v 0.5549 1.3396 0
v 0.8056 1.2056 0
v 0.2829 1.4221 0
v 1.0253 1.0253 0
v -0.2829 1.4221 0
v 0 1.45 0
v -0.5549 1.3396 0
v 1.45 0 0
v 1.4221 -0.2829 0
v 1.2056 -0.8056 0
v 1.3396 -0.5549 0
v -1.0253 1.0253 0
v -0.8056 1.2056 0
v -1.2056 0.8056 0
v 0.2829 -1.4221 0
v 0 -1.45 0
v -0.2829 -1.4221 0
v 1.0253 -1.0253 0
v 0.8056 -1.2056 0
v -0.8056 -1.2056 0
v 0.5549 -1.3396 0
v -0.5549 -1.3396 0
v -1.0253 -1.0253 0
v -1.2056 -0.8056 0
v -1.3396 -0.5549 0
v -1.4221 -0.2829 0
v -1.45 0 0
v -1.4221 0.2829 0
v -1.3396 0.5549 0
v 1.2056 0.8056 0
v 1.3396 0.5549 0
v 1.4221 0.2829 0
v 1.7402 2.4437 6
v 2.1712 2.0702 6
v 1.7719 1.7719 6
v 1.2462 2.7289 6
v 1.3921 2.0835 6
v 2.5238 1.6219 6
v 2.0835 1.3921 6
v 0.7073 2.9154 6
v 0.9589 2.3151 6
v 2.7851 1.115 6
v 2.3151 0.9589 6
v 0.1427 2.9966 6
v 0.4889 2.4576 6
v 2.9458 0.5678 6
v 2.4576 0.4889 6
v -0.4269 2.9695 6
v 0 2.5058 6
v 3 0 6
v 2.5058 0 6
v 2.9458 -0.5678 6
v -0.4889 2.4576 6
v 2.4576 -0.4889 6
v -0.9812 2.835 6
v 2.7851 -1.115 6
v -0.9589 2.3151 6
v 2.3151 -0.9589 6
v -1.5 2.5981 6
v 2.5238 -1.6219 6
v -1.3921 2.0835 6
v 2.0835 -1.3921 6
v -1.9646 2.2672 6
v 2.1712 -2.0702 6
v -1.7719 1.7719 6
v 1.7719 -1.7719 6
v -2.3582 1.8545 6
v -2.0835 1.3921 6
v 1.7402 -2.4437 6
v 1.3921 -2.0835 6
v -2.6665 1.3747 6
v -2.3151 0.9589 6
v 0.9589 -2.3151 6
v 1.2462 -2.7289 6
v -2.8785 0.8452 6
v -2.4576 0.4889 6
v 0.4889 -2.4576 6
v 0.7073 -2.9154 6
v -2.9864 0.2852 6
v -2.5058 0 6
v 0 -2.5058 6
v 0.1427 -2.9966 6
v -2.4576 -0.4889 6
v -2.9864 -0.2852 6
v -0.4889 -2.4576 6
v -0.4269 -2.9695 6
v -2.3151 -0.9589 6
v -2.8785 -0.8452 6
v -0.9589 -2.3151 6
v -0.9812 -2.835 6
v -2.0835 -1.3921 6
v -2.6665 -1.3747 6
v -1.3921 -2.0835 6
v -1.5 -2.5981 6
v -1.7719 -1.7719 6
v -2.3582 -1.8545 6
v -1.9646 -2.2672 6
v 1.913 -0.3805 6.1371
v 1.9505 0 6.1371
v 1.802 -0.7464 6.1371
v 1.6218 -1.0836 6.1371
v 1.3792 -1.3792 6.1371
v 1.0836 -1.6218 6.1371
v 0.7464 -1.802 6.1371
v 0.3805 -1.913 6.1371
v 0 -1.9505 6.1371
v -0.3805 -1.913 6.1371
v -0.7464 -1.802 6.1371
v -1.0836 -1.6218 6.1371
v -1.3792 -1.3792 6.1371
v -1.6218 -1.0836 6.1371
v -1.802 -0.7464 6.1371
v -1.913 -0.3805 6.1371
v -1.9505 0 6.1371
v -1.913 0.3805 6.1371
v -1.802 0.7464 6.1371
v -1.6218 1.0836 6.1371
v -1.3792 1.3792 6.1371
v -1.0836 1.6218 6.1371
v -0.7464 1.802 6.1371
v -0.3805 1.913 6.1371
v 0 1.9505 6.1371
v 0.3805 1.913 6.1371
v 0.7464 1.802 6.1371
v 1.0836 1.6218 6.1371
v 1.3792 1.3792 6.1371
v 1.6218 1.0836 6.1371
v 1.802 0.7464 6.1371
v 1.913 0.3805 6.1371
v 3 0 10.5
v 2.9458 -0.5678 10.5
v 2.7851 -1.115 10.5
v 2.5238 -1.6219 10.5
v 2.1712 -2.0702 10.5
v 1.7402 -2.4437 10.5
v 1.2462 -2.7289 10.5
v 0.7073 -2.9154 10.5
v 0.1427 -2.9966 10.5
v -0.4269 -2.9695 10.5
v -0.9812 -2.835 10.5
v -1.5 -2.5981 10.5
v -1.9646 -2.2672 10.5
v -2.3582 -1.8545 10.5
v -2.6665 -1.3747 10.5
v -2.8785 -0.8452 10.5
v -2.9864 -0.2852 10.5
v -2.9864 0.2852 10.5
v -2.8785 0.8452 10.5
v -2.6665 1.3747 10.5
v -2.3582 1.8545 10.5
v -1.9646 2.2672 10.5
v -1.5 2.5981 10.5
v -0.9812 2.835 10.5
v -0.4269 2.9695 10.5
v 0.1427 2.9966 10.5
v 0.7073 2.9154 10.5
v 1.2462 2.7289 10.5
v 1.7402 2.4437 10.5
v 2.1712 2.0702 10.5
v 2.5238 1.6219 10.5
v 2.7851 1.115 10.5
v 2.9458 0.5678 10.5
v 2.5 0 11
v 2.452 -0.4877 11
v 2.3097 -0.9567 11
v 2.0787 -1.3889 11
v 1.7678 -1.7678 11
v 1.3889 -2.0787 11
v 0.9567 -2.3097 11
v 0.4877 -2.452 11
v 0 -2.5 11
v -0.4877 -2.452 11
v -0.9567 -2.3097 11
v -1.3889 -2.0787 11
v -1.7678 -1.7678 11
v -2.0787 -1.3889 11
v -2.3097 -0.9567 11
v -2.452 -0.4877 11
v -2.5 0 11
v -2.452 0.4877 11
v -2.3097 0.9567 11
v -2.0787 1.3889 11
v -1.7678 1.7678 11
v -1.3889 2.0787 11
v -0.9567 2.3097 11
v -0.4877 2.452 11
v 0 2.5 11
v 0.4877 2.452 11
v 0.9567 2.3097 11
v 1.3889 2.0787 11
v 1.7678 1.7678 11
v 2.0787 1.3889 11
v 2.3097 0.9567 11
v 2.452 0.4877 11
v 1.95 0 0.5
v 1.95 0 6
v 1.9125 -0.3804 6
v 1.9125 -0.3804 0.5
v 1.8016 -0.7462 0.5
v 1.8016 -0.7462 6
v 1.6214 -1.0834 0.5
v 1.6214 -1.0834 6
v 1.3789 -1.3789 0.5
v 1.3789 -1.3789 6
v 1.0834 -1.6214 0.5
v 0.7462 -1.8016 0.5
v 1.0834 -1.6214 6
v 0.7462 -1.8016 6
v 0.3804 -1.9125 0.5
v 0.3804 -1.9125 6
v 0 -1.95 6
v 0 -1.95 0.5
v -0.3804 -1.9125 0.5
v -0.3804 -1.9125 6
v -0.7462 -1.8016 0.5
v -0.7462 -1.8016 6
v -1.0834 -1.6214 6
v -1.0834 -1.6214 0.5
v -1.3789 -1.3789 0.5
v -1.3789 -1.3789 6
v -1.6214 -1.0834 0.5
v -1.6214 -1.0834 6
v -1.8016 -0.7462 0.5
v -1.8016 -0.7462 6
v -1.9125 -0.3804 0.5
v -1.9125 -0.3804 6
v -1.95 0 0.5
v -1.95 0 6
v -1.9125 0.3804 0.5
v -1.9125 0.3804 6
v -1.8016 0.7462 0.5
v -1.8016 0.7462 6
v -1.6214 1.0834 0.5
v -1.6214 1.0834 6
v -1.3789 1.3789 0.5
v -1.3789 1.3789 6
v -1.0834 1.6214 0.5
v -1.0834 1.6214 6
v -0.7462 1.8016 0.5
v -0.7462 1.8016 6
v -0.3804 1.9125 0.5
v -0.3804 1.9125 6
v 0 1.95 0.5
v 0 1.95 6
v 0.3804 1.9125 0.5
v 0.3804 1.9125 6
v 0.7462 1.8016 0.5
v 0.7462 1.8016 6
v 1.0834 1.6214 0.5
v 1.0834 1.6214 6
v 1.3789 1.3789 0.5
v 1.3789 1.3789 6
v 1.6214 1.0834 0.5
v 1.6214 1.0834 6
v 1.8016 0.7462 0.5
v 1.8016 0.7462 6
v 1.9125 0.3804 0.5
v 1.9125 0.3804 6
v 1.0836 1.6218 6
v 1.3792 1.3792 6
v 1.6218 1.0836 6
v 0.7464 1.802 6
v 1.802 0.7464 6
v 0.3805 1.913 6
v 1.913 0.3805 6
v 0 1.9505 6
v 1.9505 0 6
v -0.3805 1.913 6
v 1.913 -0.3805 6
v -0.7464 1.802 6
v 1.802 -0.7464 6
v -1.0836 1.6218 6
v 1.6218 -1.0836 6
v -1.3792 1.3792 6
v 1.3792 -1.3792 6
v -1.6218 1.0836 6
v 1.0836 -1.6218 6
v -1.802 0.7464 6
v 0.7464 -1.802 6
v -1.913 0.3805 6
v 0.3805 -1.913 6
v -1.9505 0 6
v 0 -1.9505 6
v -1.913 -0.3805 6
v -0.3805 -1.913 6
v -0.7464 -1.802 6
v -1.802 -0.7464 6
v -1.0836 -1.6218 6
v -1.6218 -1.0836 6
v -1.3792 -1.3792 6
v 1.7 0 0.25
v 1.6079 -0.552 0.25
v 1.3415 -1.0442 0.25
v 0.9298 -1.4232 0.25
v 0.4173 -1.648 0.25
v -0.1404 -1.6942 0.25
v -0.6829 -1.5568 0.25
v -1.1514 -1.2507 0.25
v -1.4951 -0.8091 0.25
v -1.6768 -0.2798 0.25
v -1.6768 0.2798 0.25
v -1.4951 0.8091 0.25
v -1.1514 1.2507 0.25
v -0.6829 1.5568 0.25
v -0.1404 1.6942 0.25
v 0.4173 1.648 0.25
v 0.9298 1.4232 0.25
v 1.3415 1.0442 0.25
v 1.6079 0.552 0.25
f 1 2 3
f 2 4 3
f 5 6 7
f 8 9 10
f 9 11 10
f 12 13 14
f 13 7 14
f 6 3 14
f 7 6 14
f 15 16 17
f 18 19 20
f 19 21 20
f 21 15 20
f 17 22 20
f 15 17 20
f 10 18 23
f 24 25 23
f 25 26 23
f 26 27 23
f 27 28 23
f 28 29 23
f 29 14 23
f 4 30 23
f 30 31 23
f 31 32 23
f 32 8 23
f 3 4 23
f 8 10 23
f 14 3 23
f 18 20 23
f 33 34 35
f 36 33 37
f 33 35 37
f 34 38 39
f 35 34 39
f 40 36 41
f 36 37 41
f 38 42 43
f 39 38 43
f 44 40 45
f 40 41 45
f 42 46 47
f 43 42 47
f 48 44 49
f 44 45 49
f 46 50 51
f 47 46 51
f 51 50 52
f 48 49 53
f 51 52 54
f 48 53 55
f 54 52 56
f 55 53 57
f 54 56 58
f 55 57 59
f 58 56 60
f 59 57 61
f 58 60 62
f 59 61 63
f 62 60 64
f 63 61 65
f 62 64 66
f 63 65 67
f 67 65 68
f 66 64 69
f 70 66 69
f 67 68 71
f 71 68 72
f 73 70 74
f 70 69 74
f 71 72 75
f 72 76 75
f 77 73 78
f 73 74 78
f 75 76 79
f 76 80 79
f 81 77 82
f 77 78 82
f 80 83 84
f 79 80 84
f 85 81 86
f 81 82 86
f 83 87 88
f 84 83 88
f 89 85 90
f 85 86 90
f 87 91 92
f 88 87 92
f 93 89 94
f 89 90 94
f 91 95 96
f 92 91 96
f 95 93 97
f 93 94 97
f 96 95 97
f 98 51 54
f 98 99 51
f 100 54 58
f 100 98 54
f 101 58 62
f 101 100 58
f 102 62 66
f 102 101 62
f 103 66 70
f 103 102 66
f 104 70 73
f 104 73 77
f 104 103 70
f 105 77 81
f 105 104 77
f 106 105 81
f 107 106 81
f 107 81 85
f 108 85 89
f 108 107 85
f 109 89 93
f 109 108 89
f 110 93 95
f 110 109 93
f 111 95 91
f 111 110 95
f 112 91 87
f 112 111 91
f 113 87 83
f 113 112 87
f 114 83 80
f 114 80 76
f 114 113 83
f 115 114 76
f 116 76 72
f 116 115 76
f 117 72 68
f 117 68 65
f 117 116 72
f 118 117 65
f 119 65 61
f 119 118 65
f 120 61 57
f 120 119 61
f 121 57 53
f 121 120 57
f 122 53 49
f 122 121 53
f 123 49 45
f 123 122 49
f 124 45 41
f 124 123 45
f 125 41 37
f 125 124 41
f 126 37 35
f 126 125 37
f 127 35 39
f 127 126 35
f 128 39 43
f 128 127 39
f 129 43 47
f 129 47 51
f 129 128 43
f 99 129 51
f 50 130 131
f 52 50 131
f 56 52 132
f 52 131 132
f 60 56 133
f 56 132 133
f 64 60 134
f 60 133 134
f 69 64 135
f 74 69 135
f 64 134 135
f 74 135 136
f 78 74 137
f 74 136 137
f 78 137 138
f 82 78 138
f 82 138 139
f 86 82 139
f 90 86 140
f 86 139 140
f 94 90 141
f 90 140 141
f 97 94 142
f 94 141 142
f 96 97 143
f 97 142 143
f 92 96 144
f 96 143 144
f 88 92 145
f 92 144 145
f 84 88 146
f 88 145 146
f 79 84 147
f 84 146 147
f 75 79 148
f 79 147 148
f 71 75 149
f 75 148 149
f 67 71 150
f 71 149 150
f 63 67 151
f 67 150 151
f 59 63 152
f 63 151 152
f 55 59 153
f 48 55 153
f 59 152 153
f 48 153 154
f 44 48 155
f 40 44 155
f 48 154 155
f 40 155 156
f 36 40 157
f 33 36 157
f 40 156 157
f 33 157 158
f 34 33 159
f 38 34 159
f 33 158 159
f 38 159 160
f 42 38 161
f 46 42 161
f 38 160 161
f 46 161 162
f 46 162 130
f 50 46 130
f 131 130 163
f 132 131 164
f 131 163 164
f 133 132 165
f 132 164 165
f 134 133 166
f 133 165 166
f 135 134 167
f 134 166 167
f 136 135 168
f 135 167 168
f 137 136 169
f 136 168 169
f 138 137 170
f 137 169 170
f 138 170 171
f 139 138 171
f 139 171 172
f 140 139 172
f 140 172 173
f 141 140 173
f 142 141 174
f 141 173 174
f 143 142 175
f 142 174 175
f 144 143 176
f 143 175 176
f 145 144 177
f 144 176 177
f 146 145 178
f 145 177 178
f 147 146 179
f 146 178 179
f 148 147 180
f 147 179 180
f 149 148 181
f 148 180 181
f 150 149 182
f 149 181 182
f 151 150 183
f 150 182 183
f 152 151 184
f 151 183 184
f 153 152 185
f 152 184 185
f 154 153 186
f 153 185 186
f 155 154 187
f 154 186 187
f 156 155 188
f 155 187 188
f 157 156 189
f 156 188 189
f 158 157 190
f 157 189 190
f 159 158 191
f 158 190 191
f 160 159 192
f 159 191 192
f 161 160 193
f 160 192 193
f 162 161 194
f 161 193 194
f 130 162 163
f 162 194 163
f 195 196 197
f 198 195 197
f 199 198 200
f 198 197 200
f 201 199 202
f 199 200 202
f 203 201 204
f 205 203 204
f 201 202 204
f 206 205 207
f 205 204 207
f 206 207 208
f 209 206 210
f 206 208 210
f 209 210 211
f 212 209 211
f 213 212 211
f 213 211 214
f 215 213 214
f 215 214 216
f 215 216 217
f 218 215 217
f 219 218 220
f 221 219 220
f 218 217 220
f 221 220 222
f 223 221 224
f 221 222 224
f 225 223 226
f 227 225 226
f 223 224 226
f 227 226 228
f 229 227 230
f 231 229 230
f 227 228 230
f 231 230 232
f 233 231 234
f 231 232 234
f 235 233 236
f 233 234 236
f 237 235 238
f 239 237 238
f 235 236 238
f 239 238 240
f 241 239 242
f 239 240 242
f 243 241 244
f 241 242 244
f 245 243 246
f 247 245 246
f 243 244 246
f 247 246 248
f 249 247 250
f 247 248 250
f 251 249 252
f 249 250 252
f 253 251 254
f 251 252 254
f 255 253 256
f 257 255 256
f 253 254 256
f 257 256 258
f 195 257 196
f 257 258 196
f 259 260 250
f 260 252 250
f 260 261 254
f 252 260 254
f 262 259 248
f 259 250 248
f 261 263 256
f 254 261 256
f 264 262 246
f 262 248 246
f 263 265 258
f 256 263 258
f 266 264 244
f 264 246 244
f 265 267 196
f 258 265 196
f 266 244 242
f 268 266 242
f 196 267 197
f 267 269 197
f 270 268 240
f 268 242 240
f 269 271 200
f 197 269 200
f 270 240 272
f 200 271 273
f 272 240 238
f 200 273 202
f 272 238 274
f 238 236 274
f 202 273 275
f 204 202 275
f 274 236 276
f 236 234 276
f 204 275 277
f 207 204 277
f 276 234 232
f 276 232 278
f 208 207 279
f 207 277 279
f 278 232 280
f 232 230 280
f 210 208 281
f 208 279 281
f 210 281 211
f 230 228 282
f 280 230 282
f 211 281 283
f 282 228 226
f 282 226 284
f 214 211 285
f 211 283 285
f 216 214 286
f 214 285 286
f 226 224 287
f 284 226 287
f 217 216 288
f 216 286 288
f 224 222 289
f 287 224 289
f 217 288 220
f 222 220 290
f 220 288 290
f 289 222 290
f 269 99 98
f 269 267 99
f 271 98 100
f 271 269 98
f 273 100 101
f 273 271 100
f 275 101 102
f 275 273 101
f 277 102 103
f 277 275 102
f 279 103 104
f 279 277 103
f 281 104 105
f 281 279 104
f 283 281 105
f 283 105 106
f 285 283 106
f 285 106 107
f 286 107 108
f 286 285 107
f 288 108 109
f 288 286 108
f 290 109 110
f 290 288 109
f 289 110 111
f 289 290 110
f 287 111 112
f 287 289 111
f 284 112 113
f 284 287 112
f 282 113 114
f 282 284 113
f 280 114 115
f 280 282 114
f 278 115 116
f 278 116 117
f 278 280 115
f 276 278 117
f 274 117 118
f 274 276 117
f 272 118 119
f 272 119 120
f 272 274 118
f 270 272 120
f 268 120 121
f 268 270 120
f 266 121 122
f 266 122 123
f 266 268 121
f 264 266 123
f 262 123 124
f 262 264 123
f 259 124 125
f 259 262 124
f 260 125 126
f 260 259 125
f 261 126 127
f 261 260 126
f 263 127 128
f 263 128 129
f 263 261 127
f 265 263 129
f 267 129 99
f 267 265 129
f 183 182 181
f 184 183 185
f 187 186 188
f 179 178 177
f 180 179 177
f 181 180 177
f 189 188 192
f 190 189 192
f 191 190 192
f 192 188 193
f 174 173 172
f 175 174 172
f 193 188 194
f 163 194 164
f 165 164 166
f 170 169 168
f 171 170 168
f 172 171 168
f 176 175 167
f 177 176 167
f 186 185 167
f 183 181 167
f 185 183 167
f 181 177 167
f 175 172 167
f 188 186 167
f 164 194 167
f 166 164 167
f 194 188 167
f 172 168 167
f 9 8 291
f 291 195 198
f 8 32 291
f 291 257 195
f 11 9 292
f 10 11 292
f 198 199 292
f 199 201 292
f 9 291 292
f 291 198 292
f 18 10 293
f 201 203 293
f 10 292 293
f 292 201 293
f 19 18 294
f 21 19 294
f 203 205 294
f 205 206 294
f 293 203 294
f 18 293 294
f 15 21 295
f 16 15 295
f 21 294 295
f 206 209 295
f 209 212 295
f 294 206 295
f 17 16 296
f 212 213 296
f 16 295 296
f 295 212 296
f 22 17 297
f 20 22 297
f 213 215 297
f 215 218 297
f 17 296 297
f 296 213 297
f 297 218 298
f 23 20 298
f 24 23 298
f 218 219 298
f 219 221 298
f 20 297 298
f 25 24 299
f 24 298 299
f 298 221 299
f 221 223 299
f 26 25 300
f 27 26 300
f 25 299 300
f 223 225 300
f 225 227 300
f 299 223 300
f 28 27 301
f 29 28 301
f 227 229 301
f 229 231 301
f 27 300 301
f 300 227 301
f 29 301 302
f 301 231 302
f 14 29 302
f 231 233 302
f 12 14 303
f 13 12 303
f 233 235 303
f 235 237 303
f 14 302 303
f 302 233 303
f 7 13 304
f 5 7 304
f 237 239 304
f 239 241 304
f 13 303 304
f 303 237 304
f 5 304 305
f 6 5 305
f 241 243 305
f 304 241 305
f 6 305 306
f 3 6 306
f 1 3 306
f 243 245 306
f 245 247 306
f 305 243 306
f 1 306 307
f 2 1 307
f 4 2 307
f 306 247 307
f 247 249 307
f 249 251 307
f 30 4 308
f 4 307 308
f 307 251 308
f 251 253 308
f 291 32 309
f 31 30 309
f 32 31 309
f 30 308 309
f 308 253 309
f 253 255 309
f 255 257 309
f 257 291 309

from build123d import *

# Parameters (mm, degrees)
F2_SIZE = 0.5


with BuildPart() as f1:
    # F0 (on Front) → F1 (revolve)
    with BuildSketch(Plane.XZ):
        Polygon((0, 0), (1.95, 0), (1.95, 6), (3, 6), (3, 11), (0, 11), align=None)
    revolve(axis=Axis((0, 0, 5.355328), (0, 0, -1)))

    # F2
    f2_edges = [f1.edges().sort_by_distance(p)[0] for p in [
        (-3, 0, 11),
        (-1.95, 0, 0),
    ]]
    chamfer(f2_edges, length=F2_SIZE)

    # F3 (on Front) → F4 (revolve, cut)
    with BuildSketch(Plane.XZ):
        Polygon((1.950481, 6), (2.505797, 6), (1.950481, 6.137104), align=None)
    revolve(axis=Axis((0, 0, 5.414517), (0, 0, -1)), mode=Mode.SUBTRACT)


solid = f1.part
